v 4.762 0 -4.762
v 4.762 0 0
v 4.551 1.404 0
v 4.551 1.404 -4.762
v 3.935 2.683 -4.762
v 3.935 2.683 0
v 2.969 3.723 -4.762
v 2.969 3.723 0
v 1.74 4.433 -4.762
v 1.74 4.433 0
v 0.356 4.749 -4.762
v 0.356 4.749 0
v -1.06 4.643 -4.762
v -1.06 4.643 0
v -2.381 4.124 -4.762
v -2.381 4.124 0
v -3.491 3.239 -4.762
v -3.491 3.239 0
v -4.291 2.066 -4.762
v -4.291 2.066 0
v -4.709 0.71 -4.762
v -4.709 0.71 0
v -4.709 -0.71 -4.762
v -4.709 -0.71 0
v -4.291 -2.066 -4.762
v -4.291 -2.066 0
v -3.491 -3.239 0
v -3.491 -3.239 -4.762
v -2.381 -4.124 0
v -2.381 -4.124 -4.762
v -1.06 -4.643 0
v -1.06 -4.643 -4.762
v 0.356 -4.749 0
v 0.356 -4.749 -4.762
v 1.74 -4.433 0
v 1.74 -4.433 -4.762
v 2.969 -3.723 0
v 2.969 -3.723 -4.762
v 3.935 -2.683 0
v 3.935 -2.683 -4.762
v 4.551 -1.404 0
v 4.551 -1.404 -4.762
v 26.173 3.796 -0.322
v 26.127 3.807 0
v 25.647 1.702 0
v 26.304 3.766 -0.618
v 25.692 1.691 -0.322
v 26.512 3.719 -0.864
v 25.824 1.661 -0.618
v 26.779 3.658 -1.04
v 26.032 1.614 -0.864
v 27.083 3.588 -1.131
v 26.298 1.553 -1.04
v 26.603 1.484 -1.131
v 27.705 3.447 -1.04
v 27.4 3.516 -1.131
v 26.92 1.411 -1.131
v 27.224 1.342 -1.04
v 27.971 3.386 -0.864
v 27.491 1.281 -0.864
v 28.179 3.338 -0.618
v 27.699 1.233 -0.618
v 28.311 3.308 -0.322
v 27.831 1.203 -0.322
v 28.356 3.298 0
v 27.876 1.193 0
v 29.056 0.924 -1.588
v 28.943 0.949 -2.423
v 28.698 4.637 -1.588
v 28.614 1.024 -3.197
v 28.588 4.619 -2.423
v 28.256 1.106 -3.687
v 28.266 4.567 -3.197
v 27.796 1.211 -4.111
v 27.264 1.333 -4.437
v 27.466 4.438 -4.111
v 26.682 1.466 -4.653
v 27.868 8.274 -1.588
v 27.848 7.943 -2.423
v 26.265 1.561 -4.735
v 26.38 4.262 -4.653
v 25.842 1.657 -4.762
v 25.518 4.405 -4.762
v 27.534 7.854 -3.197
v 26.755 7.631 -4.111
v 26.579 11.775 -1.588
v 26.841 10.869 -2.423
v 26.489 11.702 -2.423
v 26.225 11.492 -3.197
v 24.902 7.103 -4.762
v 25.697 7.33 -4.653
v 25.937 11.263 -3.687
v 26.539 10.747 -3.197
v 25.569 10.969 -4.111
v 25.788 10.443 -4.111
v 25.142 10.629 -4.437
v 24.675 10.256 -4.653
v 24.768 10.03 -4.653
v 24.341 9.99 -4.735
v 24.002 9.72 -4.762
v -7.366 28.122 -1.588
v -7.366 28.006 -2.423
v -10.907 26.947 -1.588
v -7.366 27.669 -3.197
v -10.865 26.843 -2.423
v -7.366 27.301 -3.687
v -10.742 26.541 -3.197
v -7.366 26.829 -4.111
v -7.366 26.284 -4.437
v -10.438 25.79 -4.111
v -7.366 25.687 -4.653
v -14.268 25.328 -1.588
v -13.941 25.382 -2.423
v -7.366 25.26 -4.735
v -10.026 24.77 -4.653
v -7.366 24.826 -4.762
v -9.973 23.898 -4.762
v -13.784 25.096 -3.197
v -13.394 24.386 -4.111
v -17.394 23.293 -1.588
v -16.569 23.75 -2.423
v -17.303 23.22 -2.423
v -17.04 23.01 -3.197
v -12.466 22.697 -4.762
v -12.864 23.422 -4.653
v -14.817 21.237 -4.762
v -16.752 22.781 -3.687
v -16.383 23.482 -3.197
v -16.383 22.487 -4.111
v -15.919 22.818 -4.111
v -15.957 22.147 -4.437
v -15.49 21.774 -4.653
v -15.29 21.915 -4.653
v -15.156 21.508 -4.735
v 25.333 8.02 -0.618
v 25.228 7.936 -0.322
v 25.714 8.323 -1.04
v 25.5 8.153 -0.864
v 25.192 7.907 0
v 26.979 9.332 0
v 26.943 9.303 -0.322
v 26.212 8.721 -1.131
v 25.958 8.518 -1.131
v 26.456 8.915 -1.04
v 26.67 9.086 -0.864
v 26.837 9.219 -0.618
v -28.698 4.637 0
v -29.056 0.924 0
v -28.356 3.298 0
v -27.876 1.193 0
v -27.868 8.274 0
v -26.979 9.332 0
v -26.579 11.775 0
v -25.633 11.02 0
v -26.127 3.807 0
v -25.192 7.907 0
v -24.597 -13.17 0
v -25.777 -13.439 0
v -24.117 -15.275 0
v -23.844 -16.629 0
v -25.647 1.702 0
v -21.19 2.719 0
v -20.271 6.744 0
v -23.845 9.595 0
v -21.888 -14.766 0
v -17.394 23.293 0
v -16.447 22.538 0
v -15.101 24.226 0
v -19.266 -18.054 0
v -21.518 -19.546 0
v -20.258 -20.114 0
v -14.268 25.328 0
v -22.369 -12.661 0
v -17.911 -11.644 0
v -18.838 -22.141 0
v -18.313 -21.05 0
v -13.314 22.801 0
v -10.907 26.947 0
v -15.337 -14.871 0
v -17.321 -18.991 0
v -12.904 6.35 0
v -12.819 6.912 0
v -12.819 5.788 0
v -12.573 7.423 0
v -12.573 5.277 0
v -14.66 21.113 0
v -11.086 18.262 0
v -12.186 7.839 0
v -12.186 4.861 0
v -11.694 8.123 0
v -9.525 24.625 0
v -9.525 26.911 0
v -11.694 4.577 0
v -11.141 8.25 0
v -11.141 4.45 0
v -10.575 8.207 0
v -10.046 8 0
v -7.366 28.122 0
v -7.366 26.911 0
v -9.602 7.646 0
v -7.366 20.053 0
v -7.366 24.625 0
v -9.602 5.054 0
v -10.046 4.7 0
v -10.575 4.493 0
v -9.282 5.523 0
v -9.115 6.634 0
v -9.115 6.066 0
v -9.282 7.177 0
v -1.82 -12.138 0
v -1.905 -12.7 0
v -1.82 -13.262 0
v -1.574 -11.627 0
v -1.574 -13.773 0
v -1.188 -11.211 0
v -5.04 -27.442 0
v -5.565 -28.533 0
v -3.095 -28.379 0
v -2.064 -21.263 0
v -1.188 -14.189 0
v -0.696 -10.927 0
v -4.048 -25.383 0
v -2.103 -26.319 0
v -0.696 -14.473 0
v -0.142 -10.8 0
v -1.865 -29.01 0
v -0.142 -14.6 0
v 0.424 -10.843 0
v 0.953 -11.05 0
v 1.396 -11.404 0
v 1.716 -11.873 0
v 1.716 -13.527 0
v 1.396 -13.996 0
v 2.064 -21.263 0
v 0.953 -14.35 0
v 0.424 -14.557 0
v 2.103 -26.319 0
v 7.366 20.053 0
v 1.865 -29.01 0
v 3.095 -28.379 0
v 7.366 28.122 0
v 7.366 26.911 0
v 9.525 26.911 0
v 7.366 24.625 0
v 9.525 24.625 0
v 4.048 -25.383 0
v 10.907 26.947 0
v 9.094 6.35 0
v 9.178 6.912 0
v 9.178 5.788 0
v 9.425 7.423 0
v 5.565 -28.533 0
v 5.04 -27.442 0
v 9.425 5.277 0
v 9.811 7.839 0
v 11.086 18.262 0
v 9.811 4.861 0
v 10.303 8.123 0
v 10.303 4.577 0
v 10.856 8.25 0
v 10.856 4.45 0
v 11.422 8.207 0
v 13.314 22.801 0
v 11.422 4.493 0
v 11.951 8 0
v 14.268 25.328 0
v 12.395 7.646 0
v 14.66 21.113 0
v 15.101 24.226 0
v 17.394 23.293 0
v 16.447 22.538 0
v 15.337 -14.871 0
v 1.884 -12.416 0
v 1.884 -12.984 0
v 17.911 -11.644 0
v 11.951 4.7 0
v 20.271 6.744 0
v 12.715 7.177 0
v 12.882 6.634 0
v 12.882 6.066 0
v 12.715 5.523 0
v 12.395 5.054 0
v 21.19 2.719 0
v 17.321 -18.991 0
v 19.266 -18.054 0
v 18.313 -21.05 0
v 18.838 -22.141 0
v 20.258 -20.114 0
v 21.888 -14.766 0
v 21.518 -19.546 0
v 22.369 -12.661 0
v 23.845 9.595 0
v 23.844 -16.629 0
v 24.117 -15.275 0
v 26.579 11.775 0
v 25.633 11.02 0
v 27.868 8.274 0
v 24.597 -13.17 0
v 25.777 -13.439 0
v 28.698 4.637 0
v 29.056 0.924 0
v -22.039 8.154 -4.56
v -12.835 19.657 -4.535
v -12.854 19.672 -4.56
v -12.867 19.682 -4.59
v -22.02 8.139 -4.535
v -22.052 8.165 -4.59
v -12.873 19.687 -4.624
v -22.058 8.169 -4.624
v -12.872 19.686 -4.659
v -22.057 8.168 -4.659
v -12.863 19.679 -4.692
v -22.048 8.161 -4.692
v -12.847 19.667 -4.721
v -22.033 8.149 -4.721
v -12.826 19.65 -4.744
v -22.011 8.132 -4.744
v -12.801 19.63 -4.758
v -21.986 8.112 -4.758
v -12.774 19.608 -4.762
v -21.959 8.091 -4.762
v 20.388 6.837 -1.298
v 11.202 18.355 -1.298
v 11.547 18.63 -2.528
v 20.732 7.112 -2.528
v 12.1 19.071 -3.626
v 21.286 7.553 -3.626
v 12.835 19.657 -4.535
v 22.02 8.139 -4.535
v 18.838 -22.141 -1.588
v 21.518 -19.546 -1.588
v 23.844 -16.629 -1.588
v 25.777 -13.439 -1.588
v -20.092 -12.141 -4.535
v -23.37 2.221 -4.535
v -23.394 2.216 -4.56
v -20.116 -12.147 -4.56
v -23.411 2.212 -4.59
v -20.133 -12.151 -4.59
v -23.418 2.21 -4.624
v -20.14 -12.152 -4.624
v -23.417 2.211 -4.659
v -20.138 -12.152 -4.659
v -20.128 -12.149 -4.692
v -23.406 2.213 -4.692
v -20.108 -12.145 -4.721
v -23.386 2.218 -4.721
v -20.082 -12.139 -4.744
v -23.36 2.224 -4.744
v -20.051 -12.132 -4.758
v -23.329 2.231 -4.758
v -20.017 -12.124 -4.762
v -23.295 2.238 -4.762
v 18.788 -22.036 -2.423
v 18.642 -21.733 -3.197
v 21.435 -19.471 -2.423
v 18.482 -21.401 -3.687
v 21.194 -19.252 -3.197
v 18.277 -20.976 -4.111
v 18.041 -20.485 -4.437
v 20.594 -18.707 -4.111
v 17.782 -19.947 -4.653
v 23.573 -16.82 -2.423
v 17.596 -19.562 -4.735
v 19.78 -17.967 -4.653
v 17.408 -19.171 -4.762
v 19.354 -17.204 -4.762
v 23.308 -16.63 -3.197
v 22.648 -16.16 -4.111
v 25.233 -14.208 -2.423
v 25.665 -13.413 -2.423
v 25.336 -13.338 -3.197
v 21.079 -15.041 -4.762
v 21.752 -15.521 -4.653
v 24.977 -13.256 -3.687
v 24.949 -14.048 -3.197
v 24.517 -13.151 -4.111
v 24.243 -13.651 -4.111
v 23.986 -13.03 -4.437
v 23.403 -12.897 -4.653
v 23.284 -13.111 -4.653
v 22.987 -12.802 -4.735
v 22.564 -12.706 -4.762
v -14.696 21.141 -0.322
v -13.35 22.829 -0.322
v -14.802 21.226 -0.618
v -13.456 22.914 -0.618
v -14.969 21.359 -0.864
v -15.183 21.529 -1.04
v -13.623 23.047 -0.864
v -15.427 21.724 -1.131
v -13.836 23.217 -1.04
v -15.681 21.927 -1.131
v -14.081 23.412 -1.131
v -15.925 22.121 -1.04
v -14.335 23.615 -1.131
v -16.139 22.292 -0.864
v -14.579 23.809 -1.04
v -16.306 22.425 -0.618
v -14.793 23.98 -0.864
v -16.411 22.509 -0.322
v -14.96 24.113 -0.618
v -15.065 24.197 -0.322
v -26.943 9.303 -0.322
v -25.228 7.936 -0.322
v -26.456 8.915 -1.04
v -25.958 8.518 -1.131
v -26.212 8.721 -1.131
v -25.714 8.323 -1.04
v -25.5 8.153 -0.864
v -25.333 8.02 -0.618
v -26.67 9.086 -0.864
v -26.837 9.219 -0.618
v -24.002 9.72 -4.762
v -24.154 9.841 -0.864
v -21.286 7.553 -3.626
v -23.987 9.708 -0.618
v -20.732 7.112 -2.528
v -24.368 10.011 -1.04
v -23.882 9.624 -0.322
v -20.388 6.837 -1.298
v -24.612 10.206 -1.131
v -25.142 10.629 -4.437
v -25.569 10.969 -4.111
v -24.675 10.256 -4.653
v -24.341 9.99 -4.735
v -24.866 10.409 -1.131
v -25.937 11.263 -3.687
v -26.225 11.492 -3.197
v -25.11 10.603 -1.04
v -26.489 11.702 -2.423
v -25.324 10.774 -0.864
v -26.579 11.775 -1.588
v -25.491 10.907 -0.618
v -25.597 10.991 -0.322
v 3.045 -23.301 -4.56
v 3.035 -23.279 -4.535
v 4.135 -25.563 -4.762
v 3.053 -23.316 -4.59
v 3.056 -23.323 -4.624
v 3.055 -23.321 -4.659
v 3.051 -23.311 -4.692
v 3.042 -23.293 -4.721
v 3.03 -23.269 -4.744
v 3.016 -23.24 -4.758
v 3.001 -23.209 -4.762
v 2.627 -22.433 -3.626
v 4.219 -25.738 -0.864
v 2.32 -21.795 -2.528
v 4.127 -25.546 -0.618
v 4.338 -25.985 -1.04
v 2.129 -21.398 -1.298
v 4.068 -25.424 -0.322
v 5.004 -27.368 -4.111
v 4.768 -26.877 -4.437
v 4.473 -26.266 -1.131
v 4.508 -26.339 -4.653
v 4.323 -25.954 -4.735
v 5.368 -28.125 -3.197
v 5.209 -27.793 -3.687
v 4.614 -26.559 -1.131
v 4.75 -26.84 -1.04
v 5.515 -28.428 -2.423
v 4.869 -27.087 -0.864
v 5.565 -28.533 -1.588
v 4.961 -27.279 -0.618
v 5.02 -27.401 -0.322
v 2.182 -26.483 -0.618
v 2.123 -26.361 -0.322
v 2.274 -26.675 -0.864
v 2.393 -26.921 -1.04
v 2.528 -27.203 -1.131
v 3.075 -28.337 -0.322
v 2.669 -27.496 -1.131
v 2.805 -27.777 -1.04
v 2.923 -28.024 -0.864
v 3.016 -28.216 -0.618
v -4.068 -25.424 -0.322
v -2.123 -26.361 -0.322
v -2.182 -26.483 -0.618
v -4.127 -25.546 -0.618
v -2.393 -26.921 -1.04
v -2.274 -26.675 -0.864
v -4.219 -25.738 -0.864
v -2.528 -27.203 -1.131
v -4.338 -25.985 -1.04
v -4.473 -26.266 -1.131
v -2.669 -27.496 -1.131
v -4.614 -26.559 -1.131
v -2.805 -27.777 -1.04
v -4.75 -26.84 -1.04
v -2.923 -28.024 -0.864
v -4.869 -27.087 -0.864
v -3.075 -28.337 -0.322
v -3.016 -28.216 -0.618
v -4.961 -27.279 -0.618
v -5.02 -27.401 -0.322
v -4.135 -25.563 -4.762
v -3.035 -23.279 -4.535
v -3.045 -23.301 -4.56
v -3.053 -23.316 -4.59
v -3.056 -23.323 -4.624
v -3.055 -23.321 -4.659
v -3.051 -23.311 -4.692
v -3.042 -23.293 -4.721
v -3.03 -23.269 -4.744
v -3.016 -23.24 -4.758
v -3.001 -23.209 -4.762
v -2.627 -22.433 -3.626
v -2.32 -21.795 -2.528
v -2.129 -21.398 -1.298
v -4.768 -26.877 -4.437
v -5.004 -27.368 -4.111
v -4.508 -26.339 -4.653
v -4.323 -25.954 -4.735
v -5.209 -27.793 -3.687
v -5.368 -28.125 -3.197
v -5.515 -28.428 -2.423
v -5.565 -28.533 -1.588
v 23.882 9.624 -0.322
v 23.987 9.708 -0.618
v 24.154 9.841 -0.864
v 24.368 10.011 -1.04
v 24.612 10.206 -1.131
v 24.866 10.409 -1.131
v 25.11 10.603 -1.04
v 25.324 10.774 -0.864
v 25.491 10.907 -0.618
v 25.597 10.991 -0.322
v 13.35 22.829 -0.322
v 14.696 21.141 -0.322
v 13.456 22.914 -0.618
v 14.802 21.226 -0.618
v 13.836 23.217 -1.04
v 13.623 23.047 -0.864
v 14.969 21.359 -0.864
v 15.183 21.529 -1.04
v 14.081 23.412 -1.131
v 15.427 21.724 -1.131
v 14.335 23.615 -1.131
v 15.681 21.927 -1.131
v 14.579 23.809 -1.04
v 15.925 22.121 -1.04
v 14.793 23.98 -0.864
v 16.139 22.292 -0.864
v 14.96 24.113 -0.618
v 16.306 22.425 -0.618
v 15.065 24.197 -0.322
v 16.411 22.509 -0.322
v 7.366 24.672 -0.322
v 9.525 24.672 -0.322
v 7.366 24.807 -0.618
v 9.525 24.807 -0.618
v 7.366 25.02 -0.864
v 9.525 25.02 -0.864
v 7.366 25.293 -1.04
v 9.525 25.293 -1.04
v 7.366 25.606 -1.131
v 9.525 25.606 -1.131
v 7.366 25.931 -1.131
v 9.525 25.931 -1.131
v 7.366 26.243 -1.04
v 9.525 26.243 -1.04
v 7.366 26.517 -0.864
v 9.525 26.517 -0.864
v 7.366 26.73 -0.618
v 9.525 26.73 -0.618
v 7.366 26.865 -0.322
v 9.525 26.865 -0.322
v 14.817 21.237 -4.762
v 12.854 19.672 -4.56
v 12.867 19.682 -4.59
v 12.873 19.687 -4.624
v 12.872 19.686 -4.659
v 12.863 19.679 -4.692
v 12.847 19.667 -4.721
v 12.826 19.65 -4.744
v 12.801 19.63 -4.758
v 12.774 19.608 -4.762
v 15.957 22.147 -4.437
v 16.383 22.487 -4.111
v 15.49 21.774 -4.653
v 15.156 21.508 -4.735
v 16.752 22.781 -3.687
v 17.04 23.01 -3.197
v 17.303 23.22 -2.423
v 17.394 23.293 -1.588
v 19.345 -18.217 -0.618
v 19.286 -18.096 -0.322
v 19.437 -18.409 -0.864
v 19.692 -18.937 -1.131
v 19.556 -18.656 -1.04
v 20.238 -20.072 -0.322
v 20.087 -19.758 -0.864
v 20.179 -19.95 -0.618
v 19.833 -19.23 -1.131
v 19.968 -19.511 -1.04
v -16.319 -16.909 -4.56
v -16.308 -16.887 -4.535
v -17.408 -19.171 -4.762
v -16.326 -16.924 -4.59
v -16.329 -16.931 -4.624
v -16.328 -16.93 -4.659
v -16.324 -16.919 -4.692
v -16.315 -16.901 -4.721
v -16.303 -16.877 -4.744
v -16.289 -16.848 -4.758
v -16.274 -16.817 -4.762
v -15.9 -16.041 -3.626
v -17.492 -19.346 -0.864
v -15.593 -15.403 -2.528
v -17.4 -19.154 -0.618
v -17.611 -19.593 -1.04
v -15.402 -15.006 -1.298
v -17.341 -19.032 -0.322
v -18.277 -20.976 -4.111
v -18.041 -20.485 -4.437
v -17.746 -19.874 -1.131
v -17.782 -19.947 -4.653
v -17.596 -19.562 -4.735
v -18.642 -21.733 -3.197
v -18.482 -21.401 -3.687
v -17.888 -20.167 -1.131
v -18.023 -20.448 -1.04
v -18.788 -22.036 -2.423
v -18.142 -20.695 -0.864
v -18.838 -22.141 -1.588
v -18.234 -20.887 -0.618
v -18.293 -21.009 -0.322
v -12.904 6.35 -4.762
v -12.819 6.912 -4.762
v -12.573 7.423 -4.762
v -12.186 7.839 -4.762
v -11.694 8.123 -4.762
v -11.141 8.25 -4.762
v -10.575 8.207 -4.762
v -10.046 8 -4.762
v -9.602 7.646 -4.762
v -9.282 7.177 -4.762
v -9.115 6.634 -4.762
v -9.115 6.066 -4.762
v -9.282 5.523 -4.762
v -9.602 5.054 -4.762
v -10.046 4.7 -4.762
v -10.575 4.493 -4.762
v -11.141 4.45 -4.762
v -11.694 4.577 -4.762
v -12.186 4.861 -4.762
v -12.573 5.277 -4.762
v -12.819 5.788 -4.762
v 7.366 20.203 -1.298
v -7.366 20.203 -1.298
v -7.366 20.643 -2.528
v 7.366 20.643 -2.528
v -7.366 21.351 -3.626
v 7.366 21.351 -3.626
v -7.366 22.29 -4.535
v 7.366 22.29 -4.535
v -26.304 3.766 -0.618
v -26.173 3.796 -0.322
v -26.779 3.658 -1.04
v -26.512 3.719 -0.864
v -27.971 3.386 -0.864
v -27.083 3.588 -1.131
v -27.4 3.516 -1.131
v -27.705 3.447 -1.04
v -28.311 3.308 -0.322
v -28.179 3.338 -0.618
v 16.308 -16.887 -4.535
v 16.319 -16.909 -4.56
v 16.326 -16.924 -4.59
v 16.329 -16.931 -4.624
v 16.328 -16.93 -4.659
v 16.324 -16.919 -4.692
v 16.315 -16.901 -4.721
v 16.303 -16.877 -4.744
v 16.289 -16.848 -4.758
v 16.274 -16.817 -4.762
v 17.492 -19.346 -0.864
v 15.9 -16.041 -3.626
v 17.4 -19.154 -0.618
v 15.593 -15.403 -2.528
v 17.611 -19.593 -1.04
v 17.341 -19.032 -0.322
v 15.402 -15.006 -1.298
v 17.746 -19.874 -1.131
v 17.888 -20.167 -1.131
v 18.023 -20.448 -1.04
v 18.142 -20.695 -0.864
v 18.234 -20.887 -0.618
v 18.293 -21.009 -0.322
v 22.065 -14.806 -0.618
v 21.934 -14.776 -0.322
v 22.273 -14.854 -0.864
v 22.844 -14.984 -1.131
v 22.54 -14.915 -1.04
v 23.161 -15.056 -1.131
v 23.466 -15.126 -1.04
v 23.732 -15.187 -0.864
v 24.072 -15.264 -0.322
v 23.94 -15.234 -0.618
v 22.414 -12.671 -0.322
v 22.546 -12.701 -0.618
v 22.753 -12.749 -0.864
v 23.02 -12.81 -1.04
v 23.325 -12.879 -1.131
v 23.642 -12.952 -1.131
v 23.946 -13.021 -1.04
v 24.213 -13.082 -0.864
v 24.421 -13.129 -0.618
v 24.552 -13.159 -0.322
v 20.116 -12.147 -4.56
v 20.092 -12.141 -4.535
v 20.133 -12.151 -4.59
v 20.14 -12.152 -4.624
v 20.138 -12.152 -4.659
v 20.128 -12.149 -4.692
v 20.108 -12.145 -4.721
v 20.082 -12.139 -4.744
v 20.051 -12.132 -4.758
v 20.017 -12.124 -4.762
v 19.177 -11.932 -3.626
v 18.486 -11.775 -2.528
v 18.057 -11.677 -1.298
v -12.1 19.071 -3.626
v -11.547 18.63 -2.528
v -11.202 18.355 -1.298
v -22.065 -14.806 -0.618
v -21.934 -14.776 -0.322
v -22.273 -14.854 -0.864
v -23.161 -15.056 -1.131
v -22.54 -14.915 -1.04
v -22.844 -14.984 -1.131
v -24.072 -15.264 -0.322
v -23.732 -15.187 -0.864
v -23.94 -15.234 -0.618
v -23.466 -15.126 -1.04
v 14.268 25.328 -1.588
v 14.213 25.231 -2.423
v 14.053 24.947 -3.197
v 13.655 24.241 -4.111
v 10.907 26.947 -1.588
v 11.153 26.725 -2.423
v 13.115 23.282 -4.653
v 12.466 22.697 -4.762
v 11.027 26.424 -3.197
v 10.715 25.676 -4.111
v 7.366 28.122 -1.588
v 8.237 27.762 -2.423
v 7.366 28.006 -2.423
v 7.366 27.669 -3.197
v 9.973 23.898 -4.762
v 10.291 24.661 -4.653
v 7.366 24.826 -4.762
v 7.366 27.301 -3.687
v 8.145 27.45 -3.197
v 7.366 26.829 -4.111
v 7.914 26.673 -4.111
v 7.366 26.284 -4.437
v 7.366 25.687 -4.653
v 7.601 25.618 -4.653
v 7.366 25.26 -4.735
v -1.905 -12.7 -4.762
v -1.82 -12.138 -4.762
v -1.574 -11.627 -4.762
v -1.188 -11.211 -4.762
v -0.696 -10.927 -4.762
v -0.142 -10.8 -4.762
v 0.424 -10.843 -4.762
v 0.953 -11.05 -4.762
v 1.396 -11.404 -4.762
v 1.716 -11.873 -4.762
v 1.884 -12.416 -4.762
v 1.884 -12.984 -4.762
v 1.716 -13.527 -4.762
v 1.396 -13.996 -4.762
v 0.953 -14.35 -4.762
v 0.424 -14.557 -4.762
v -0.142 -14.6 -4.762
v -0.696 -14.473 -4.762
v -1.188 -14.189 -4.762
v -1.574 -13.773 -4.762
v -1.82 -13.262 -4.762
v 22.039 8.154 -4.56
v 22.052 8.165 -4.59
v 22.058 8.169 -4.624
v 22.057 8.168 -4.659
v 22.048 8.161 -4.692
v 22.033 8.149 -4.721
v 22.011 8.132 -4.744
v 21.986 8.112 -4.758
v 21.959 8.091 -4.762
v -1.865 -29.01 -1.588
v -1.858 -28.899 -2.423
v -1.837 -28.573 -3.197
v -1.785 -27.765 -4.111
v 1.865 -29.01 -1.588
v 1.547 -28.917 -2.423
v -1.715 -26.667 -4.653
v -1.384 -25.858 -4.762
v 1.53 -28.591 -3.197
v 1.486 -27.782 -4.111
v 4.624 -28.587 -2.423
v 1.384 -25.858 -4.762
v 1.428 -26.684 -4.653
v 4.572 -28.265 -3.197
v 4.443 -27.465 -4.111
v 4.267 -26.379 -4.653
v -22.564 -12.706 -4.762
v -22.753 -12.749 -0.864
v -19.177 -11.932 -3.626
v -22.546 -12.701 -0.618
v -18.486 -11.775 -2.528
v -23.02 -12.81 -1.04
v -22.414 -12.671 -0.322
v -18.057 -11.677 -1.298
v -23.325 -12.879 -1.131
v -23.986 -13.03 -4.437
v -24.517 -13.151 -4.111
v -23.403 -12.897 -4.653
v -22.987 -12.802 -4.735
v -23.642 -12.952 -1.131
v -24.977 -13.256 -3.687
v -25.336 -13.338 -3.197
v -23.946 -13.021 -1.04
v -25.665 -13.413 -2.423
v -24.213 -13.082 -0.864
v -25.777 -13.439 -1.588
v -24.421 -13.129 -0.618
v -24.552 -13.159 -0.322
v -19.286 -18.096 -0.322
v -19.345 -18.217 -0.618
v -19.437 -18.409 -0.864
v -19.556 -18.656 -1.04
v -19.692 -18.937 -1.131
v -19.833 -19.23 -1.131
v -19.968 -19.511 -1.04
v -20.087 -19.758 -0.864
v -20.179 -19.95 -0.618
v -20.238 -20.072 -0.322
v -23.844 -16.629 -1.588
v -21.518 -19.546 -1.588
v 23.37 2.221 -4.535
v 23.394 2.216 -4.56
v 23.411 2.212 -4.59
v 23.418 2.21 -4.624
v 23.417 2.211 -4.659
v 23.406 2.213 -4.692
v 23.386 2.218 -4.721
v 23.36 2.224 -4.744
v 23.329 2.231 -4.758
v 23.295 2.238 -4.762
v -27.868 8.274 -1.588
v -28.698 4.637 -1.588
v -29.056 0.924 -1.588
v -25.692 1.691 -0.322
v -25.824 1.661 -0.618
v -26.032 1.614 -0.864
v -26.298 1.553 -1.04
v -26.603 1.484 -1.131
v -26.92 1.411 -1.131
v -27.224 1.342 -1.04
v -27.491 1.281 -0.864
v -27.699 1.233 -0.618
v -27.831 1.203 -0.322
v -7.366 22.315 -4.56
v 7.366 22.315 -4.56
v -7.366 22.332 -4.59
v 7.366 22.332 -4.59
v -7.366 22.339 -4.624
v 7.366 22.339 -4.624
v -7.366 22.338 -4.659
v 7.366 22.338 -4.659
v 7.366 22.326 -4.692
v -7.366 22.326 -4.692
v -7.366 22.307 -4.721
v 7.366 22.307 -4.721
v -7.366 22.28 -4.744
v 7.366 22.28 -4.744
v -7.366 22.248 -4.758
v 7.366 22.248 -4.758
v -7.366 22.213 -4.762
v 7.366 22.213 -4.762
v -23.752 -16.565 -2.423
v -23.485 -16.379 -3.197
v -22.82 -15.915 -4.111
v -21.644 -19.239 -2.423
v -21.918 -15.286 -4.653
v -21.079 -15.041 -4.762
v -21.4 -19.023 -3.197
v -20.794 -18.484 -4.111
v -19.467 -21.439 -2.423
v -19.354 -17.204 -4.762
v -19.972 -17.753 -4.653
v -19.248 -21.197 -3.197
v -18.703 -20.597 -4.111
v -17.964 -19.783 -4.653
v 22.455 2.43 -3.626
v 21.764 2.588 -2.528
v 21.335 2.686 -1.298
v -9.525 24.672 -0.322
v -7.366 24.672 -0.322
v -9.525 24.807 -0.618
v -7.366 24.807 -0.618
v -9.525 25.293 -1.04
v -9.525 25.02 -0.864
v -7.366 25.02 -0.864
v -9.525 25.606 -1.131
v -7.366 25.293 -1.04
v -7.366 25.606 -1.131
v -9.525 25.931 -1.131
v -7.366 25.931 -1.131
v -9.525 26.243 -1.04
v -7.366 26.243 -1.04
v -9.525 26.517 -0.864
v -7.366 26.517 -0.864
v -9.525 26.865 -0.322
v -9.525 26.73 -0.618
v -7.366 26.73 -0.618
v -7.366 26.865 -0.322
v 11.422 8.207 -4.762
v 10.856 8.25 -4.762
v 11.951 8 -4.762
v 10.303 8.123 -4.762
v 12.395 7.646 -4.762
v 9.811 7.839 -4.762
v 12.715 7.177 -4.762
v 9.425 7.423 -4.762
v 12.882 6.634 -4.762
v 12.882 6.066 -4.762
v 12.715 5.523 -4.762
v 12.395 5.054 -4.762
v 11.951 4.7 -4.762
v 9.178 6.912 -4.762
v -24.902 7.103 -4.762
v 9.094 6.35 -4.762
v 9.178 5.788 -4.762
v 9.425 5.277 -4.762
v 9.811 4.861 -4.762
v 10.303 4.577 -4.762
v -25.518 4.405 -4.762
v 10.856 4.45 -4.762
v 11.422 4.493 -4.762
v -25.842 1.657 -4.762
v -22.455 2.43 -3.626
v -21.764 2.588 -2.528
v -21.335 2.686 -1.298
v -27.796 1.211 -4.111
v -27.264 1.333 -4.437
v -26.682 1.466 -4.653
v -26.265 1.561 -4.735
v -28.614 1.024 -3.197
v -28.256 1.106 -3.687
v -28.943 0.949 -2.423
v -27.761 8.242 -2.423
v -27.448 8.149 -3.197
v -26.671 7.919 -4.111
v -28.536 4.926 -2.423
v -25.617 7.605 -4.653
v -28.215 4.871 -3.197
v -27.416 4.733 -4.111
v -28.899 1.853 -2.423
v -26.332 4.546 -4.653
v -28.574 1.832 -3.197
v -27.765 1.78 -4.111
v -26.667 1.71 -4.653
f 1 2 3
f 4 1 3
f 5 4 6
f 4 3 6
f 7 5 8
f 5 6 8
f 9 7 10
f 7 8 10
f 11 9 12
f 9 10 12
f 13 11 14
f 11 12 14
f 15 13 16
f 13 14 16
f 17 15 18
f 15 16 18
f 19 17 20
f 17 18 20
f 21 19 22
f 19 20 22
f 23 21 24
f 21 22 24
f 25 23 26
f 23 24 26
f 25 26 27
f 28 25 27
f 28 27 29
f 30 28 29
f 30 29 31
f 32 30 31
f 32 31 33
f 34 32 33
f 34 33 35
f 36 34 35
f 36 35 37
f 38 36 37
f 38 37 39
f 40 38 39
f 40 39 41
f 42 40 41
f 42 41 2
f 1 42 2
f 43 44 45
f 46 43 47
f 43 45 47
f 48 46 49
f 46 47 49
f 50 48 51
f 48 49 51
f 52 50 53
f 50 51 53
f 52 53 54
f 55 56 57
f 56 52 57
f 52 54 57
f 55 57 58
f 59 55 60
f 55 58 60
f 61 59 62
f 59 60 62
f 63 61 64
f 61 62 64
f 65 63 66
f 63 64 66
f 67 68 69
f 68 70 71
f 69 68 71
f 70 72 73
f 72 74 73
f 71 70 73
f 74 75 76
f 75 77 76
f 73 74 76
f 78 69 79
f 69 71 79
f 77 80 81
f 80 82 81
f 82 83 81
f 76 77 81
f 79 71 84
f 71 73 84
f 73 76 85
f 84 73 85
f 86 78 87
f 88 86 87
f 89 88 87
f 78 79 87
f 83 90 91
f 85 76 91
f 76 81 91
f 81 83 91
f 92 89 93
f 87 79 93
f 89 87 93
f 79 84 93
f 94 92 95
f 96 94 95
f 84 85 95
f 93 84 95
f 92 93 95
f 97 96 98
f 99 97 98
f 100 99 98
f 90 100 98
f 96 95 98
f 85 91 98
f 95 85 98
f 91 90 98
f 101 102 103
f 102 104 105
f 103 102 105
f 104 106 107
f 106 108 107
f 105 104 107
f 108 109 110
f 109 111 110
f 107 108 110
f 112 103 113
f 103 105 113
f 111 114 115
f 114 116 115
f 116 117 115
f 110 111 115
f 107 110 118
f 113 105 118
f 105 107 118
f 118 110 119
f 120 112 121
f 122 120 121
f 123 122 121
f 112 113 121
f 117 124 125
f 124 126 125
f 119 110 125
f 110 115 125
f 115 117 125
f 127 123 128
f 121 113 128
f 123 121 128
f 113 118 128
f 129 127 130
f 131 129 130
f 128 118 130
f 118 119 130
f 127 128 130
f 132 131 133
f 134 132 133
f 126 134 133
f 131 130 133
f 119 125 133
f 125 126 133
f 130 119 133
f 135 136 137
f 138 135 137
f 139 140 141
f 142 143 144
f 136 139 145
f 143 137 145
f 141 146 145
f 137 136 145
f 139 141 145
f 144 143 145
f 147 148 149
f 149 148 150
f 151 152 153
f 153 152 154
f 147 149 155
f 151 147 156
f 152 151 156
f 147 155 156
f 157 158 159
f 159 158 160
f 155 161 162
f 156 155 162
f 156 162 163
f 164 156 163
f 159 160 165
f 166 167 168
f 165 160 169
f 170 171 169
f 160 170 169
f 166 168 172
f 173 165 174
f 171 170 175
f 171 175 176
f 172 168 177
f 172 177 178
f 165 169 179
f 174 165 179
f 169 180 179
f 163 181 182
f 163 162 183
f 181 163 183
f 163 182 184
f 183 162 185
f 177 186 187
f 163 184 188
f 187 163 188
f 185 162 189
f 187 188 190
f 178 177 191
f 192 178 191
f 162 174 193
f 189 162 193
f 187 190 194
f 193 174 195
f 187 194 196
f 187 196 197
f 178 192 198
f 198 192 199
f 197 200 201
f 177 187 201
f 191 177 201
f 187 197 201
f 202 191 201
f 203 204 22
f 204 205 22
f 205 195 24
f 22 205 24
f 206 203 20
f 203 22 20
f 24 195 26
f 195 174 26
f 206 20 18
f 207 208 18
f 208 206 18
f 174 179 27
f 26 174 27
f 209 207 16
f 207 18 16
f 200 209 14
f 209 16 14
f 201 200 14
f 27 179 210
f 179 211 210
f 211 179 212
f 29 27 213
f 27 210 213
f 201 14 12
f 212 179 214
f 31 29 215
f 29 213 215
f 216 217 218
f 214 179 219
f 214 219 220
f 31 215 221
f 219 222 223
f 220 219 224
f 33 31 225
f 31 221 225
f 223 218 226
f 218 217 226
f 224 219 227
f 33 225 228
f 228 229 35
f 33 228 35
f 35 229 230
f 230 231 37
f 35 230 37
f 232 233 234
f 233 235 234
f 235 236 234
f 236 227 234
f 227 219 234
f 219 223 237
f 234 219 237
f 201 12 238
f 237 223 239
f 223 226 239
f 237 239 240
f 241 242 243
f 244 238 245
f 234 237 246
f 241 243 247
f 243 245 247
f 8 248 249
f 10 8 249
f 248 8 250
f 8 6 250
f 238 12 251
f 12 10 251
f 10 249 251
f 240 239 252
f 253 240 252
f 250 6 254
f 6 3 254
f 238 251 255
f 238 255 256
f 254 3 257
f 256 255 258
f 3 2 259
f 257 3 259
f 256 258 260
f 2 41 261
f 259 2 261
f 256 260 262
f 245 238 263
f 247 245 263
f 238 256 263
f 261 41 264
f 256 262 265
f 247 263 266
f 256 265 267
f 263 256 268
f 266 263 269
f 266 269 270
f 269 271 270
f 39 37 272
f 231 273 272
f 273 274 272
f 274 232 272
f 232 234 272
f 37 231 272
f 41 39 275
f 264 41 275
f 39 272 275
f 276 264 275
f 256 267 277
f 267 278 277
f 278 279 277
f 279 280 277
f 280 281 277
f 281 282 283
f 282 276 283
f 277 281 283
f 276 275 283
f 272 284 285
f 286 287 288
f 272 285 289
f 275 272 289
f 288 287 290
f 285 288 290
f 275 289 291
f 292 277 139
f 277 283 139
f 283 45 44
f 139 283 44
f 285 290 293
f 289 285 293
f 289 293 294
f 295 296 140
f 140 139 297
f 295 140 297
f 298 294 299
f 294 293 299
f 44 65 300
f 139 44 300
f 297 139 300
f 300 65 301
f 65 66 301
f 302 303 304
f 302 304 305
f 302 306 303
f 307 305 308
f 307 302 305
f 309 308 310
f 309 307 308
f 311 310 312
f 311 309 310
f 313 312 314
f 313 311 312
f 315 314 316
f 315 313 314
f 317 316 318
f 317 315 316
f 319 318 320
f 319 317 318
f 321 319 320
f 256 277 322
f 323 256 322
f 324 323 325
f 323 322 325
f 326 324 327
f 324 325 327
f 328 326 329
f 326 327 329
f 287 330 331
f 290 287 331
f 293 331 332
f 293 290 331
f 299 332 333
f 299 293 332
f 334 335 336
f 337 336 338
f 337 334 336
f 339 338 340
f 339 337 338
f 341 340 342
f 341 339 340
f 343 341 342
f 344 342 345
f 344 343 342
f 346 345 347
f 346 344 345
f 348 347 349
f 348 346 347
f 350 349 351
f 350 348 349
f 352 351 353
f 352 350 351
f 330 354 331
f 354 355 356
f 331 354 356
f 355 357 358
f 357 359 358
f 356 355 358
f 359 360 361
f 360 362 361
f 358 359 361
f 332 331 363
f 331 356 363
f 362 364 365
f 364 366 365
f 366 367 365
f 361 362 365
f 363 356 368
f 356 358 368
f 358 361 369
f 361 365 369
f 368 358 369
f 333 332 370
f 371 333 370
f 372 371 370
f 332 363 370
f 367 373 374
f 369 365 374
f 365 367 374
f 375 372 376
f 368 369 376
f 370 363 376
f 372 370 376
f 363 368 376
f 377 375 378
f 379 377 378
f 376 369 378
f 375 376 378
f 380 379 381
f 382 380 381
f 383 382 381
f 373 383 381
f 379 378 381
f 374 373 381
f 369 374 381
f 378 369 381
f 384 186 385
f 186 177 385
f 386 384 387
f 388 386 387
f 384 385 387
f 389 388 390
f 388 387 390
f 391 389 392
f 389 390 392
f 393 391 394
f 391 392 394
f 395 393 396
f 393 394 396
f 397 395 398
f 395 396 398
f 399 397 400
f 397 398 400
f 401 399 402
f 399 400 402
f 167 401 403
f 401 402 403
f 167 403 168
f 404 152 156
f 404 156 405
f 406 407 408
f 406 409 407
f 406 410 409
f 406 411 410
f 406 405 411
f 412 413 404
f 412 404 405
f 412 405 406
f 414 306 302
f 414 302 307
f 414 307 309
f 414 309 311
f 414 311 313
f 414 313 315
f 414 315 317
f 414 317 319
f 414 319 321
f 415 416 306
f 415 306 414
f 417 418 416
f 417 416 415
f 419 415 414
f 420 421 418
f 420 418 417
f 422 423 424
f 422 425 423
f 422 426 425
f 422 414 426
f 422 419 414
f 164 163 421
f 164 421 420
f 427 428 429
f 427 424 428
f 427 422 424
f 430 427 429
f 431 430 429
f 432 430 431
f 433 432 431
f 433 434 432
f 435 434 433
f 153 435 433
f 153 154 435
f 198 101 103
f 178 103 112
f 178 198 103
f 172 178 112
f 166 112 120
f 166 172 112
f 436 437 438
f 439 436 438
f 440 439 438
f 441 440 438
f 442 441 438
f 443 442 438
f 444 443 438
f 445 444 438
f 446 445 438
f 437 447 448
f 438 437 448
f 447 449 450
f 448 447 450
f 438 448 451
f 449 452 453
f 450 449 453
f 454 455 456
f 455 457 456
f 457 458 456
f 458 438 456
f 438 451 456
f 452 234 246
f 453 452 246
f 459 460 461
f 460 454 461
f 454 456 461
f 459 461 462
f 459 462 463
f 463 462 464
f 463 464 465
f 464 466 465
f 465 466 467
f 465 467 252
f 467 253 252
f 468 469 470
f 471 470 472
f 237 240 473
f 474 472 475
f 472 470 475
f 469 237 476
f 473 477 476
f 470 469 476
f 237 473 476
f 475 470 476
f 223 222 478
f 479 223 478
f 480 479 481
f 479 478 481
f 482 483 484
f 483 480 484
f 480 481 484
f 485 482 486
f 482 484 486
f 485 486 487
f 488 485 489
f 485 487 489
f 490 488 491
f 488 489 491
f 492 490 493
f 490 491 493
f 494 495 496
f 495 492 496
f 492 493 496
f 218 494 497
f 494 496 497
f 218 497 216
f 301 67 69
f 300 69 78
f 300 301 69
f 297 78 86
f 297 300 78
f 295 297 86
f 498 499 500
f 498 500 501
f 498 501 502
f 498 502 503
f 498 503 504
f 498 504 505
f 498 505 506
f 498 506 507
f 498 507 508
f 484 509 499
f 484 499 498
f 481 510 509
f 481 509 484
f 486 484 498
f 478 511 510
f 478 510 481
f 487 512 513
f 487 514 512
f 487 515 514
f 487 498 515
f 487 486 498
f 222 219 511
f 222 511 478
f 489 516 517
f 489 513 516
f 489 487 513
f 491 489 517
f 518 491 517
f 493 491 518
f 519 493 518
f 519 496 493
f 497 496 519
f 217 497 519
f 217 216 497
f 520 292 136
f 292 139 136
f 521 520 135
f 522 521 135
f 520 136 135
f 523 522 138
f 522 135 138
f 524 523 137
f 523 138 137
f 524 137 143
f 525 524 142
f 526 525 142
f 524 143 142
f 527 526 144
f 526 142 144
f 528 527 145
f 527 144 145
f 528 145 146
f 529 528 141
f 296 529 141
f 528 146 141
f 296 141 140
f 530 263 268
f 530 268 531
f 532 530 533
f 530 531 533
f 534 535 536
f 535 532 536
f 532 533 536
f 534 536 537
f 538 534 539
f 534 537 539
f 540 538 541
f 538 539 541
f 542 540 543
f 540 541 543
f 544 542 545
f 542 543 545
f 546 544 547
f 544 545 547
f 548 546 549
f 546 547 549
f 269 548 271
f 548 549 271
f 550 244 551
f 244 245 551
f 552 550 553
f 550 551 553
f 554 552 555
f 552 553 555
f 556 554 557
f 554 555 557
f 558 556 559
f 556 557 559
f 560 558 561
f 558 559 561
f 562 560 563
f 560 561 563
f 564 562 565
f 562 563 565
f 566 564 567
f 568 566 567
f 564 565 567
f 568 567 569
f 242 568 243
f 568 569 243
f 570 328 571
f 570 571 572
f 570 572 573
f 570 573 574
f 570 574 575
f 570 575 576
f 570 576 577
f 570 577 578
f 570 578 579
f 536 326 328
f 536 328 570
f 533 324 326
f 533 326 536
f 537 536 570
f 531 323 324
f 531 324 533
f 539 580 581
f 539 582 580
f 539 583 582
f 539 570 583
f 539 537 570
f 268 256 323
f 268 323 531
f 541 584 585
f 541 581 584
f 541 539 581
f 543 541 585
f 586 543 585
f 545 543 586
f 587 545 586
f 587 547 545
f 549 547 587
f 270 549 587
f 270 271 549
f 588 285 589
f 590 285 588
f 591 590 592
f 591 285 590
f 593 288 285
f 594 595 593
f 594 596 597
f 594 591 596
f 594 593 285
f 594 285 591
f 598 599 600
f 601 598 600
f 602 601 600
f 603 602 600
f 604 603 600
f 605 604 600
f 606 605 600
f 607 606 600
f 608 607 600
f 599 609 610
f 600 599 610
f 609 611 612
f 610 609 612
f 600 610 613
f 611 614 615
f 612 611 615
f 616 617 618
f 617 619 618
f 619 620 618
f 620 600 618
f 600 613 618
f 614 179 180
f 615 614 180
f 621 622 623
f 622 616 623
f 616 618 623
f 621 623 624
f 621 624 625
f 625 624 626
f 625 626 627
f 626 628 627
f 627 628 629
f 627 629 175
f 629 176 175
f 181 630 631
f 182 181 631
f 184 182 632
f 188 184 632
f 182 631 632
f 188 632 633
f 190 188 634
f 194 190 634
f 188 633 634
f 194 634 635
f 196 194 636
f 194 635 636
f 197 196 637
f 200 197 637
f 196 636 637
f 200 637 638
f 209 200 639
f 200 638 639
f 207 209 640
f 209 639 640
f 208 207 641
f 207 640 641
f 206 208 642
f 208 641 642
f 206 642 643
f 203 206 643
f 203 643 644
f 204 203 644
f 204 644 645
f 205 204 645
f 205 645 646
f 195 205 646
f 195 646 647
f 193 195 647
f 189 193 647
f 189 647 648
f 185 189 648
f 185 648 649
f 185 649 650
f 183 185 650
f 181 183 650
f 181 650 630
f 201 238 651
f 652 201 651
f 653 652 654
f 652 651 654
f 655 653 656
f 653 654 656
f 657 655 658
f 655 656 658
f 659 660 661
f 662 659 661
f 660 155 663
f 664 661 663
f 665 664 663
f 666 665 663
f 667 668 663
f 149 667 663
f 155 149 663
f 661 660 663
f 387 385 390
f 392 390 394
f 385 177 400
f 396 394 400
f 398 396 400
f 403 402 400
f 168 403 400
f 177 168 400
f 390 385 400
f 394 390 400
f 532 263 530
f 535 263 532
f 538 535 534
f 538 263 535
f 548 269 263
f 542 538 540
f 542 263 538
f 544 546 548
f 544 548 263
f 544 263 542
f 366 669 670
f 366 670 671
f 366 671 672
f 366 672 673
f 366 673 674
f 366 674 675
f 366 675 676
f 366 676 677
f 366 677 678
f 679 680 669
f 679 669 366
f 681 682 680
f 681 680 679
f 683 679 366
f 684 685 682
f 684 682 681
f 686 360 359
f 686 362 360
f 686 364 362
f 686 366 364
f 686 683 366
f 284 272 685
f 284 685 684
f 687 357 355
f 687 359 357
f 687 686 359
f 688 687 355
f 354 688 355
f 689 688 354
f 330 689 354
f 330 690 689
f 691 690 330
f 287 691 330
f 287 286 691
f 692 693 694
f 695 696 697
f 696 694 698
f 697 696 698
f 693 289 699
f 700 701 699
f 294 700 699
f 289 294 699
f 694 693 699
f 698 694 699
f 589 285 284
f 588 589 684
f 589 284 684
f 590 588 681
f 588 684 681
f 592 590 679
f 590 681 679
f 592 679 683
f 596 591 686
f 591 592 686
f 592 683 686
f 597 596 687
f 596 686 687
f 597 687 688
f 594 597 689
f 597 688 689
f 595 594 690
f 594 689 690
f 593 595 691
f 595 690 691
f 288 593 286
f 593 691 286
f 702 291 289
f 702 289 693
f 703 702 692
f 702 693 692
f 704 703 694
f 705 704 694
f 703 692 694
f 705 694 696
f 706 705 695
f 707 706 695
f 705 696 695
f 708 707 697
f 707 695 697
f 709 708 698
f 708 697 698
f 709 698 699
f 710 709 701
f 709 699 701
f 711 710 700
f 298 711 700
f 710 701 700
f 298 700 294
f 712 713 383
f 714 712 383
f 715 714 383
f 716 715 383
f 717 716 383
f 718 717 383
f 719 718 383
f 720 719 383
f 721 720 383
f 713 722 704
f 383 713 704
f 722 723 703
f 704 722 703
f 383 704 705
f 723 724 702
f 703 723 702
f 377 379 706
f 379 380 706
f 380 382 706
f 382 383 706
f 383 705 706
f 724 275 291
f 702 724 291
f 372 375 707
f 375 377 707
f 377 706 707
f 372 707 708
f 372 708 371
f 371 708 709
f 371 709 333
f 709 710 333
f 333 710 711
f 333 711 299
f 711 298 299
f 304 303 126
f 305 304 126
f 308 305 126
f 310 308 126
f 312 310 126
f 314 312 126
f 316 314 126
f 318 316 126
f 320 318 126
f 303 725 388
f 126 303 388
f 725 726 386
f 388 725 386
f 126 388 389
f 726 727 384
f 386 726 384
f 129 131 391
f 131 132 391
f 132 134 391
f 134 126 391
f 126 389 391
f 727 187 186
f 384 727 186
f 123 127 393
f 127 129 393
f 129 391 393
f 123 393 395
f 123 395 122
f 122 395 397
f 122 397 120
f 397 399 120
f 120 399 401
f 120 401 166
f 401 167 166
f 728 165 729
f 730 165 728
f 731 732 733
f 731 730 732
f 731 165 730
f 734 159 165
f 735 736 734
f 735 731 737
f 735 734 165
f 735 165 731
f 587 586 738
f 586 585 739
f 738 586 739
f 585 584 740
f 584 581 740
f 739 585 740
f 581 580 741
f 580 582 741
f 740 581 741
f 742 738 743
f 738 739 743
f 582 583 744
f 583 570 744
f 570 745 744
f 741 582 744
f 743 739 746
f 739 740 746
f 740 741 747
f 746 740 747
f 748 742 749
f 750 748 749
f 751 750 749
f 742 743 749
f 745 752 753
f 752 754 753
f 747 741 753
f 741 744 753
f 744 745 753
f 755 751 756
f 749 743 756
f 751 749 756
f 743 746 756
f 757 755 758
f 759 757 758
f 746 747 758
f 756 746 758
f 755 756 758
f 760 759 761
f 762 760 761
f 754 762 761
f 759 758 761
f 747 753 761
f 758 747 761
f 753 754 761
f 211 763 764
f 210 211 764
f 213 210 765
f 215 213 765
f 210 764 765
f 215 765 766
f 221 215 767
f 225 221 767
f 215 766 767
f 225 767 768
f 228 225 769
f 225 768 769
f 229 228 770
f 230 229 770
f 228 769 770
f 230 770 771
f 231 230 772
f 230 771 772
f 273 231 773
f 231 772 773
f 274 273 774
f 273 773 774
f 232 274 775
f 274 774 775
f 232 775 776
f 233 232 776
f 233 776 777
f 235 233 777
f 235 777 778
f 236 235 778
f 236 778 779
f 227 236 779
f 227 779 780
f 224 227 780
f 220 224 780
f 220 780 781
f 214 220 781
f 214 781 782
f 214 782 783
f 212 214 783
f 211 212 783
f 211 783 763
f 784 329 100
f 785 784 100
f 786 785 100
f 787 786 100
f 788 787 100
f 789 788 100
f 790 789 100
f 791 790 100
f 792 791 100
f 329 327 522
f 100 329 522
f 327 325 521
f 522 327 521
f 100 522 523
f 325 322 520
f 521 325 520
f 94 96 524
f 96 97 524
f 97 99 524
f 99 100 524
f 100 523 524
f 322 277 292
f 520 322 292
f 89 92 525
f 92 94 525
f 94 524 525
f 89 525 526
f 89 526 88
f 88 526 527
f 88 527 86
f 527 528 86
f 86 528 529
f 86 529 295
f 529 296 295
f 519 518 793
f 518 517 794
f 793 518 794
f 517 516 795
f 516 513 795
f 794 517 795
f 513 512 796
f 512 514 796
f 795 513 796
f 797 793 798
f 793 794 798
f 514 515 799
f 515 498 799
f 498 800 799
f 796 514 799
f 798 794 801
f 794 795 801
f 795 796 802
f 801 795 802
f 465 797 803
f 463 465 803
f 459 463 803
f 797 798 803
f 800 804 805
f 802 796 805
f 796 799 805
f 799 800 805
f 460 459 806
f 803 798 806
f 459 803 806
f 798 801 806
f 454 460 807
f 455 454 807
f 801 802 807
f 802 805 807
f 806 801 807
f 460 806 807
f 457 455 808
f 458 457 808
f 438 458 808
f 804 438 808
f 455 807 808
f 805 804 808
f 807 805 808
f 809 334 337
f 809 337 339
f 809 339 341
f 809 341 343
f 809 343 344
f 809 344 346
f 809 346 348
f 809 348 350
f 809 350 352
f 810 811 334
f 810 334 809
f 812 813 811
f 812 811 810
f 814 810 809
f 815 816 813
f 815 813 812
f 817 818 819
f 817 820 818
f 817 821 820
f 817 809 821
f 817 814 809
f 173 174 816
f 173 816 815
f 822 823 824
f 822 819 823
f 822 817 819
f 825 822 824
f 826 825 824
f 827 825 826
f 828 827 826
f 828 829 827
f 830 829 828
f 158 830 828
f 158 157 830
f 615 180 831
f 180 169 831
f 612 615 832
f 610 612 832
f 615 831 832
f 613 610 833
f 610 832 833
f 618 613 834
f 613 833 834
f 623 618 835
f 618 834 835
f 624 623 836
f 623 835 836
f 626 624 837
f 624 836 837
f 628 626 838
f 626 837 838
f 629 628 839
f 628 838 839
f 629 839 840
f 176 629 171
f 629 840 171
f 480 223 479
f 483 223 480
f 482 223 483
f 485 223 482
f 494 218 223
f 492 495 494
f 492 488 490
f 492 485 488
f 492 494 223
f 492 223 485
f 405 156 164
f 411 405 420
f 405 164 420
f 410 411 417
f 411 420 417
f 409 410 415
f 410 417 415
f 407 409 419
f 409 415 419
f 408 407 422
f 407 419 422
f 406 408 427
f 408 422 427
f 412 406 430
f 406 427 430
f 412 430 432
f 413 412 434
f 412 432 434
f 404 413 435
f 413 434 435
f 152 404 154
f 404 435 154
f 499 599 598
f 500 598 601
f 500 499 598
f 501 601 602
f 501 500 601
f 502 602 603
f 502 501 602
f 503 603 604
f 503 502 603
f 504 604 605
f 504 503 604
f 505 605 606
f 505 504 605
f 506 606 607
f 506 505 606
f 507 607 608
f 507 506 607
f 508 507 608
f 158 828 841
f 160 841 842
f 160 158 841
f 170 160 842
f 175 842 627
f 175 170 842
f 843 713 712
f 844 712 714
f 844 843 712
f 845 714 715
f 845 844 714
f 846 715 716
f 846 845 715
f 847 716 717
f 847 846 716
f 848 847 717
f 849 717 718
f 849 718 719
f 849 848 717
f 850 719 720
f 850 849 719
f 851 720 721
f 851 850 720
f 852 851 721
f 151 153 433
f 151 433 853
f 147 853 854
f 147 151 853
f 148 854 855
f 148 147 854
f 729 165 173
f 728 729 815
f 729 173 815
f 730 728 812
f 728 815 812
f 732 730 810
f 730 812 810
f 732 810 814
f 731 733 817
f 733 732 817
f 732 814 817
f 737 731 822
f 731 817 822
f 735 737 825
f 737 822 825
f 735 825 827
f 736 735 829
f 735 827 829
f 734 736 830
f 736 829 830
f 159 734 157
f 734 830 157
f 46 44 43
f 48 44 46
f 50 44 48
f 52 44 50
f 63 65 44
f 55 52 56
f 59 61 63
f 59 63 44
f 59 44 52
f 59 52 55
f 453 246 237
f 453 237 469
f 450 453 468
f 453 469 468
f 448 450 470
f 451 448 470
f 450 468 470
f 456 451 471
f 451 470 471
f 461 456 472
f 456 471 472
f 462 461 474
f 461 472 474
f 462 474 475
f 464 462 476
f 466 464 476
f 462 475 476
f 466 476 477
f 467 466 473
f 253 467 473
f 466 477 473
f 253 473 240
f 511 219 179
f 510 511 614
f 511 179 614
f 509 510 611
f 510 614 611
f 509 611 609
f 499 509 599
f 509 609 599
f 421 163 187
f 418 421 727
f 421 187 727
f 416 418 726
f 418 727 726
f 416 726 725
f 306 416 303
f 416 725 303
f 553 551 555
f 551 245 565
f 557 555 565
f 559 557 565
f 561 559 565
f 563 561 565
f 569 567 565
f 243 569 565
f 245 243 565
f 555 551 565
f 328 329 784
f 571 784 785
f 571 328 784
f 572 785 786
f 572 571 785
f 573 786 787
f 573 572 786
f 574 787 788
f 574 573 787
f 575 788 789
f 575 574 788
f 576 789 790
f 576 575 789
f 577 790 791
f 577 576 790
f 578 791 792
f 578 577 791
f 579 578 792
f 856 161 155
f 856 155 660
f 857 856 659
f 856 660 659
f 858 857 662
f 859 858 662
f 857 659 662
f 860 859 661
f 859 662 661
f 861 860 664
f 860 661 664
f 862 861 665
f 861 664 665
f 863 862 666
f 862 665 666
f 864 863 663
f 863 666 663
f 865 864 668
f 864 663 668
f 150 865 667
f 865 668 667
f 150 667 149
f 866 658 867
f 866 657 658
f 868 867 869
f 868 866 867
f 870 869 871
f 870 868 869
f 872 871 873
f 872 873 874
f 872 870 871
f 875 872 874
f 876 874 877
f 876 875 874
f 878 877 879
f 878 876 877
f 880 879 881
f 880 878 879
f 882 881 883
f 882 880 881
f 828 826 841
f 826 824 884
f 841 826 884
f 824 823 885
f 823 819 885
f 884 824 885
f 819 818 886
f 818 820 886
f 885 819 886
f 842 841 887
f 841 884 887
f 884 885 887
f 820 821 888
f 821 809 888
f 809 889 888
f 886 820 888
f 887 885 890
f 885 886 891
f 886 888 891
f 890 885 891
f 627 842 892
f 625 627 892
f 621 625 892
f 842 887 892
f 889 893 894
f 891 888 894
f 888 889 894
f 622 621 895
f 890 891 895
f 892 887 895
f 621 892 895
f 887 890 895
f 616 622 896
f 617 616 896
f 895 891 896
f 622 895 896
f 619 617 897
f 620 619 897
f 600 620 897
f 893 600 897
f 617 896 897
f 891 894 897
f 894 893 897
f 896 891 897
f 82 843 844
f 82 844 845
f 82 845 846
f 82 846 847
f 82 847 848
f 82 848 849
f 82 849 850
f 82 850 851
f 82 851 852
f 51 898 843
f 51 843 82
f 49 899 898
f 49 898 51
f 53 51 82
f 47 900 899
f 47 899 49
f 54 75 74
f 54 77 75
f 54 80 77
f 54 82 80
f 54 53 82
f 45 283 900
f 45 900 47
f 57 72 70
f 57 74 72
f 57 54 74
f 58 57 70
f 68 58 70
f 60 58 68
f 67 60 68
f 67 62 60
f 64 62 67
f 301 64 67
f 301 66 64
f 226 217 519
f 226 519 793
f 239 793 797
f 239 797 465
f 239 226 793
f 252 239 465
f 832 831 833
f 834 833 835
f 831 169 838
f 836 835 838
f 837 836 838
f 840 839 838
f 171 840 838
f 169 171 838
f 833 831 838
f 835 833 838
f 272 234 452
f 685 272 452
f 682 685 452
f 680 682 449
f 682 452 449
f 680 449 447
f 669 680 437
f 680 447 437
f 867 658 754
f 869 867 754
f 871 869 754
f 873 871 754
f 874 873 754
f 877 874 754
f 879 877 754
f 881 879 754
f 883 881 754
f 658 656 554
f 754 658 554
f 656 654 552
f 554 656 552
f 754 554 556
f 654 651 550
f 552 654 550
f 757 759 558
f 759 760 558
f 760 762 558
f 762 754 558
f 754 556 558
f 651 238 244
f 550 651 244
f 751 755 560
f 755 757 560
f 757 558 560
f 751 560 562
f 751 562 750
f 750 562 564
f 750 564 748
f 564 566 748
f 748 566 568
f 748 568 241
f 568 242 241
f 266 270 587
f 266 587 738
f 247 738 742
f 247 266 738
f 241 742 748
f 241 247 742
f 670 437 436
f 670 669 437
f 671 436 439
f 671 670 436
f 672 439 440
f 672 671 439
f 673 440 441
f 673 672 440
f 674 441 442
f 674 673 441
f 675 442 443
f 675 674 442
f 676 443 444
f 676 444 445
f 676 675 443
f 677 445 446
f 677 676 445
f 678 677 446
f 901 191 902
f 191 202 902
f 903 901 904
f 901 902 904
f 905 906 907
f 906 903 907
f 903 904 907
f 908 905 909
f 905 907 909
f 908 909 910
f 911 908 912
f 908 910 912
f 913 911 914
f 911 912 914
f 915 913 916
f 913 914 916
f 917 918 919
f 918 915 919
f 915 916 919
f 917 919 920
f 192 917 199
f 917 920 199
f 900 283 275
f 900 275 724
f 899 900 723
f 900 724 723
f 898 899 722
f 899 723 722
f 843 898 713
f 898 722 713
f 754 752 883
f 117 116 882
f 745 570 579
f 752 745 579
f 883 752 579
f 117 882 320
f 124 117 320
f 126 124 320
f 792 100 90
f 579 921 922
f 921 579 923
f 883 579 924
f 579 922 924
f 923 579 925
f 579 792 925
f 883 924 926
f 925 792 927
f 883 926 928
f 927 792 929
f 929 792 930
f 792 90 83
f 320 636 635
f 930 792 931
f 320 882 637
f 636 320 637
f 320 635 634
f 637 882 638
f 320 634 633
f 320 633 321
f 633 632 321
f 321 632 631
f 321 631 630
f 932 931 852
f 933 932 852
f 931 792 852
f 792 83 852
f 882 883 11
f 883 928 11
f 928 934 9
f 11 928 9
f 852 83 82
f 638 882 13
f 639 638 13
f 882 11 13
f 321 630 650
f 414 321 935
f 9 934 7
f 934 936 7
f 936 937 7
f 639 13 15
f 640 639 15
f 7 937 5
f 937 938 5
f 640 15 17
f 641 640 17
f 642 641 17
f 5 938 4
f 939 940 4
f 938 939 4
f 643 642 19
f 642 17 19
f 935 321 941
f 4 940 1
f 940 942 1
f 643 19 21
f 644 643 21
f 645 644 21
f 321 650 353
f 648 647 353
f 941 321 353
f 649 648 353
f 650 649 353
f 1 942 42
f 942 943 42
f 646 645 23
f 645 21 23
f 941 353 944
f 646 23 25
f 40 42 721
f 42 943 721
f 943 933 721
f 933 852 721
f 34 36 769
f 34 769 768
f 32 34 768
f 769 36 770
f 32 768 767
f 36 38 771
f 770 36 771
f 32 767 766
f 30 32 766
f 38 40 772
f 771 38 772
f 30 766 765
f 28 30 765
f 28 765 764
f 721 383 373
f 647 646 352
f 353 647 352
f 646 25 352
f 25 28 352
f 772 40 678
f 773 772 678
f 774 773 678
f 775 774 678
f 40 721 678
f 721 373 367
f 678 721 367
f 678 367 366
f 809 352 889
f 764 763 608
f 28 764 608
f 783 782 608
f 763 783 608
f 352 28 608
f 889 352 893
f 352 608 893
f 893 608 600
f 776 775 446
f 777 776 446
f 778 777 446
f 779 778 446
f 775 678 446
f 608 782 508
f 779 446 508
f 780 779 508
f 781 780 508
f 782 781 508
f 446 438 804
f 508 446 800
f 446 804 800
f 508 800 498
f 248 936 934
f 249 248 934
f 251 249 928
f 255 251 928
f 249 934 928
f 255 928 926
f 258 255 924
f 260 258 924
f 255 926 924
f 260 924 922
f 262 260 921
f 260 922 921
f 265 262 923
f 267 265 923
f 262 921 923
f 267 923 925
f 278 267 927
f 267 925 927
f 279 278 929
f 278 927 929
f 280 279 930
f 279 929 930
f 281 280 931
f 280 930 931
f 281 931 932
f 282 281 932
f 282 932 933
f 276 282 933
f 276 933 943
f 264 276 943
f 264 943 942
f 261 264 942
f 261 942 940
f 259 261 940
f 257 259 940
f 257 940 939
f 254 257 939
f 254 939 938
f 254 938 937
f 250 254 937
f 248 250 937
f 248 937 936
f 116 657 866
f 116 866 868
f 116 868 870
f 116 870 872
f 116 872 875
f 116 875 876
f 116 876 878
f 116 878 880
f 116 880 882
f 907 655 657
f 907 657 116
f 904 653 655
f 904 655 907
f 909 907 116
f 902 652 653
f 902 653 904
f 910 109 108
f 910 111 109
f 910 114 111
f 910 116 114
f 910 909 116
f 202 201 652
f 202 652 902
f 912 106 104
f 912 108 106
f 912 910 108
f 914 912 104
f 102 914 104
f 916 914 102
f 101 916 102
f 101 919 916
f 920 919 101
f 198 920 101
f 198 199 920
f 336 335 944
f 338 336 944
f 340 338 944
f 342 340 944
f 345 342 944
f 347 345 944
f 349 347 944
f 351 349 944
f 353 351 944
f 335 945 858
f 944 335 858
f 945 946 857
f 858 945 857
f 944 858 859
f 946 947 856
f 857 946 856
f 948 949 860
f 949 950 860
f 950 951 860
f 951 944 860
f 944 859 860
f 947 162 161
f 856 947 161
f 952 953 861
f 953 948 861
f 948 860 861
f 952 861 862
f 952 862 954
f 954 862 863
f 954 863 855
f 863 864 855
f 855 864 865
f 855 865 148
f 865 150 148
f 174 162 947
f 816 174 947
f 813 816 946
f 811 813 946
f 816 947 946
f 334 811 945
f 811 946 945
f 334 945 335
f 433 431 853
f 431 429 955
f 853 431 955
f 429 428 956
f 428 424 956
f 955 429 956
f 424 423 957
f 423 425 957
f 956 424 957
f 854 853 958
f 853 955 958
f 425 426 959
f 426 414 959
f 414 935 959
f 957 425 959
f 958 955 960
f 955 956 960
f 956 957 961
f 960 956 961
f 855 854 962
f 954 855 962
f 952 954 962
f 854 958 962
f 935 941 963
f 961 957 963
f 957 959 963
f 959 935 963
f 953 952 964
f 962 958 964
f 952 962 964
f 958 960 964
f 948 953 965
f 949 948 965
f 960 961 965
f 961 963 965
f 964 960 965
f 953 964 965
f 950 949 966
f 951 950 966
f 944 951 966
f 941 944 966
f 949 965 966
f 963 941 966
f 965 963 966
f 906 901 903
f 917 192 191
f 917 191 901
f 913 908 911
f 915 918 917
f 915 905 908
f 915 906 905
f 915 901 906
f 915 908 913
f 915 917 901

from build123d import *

# Parameters (mm, degrees)
SKETCH1_R                = 29.0703
BOSS_EXTRUDE2_DEPTH      = 4.7625
FILLET1_R                = 3.175
SKETCH2_W                = 14.732
SKETCH2_H                = 10.414
CUT_EXTRUDE2_DEPTH       = 12.7
CIRPATTERN1_COUNT        = 7
SKETCH4_R                = 1.143
CUT_EXTRUDE4_DEPTH       = 9.525
CIRPATTERN2_COUNT        = 7
SKETCH6_R                = 1.905
CUT_EXTRUDE7_DEPTH       = 42.376236281
BOSS_EXTRUDE4_REACH      = 48.843
FILLET2_R                = 0.127
CIRPATTERN5_COUNT        = 7
FILLET2_OF_CIRPATTERN5_R = 0.127
CUT_EXTRUDE9_REACH       = 43.376
SKETCH5_R                = 4.7625


with BuildPart() as part:
    # Sketch1 → Boss-Extrude2 (new body)
    with BuildSketch(Plane.XY):
        Circle(SKETCH1_R)
    extrude(amount=-BOSS_EXTRUDE2_DEPTH)

    # Fillet1
    fillet1_edges = [part.edges().sort_by_distance(p)[0] for p in [
        (-29.0703, 0, -4.7625),
    ]]
    fillet(fillet1_edges, radius=FILLET1_R)

    # Sketch2 → Cut-Extrude2 (cut)
    with BuildSketch(Plane.XY):
        with Locations((0, 25.1333)):
            Rectangle(SKETCH2_W, SKETCH2_H)
    cut_extrude2 = extrude(amount=-CUT_EXTRUDE2_DEPTH, mode=Mode.SUBTRACT)

    # CirPattern1: Cut-Extrude2 ×7 about axis
    cirpattern1_axis = Axis((0, 0, 0), (0, 0, 1))
    for i in range(1, CIRPATTERN1_COUNT):
        add(cut_extrude2.rotate(cirpattern1_axis, i * 360 / CIRPATTERN1_COUNT), mode=Mode.SUBTRACT)

    # Sketch4 → Cut-Extrude4 (cut, symmetric)
    with BuildSketch(Plane(origin=(0, 0, 0), x_dir=(0, 0, -1), z_dir=(1, 0, 0))):
        with Locations((0, 25.7683)):
            Circle(SKETCH4_R)
    cut_extrude4 = extrude(amount=CUT_EXTRUDE4_DEPTH, both=True, mode=Mode.SUBTRACT)

    # CirPattern2: Cut-Extrude4 ×7 about axis
    cirpattern2_axis = Axis((0, 0, 0), (0, 0, 1))
    for i in range(1, CIRPATTERN2_COUNT):
        add(cut_extrude4.rotate(cirpattern2_axis, i * 360 / CIRPATTERN2_COUNT), mode=Mode.SUBTRACT)

    # Sketch6 → Cut-Extrude7 (cut, through all)
    with BuildSketch(Plane(origin=(0, 0, -4.7625), x_dir=(-1, 0, 0), z_dir=(0, 0, -1))):
        with Locations((0, -12.7)):
            Circle(SKETCH6_R)
        with Locations((-10.998522628, 6.35)):
            Circle(SKETCH6_R)
        with Locations((10.998522628, 6.35)):
            Circle(SKETCH6_R)
    extrude(amount=-CUT_EXTRUDE7_DEPTH, mode=Mode.SUBTRACT)

    # Sketch10 → Boss-Extrude4 (add, up to next)
    with BuildSketch(Plane.ZY.offset(-7.366), mode=Mode.PRIVATE) as boss_extrude4_sk1:
        with BuildLine():
            Line((-4.7625, 19.9263), (0, 19.9263))
            Line((0, 19.9263), (0, 20.0533))
            ThreePointArc((0, 20.0533), (-2.7025038, 20.73265722), (-4.7625, 22.609214887))
            Line((-4.7625, 22.609214887), (-4.7625, 19.9263))
        make_face()
    boss_extrude4_tool1 = extrude(boss_extrude4_sk1.sketch, amount=BOSS_EXTRUDE4_REACH, mode=Mode.PRIVATE) - part.part
    boss_extrude4 = boss_extrude4_tool1.solids().sort_by_distance((7.366, 20.664807, -3.452063))[0]
    add(boss_extrude4)

    # Fillet2
    fillet2_edges = [part.edges().sort_by_distance(p)[0] for p in [
        (0, 22.609214887, -4.7625),
    ]]
    fillet(fillet2_edges, radius=FILLET2_R)

    # CirPattern5: Boss-Extrude4 ×7 about axis
    cirpattern5_axis = Axis((0, 0, 0), (0, 0, 1))
    for i in range(1, CIRPATTERN5_COUNT):
        add(boss_extrude4.rotate(cirpattern5_axis, i * 360 / CIRPATTERN5_COUNT))

    # Fillet2 of CirPattern5
    fillet2_of_cirpattern5_edges = [part.edges().sort_by_distance(p)[0] for p in [
        (-17.676595993, 14.09661491, -4.7625),
        (-22.042354666, -5.031023613, -4.7625),
        (-9.809770694, -20.370198741, -4.7625),
        (9.809770694, -20.370198741, -4.7625),
        (22.042354666, -5.031023613, -4.7625),
        (17.676595993, 14.09661491, -4.7625),
    ]]
    fillet(fillet2_of_cirpattern5_edges, radius=FILLET2_OF_CIRPATTERN5_R)

    # Sketch5 → Cut-Extrude9 (cut, up to next)
    with BuildSketch(Plane.XY, mode=Mode.PRIVATE) as cut_extrude9_sk1:
        Circle(SKETCH5_R)
    cut_extrude9_tool1 = extrude(cut_extrude9_sk1.sketch, amount=-CUT_EXTRUDE9_REACH, mode=Mode.PRIVATE) & part.part
    add(cut_extrude9_tool1.solids().sort_by_distance((0, 0, 0))[0], mode=Mode.SUBTRACT)


solid = part.part
